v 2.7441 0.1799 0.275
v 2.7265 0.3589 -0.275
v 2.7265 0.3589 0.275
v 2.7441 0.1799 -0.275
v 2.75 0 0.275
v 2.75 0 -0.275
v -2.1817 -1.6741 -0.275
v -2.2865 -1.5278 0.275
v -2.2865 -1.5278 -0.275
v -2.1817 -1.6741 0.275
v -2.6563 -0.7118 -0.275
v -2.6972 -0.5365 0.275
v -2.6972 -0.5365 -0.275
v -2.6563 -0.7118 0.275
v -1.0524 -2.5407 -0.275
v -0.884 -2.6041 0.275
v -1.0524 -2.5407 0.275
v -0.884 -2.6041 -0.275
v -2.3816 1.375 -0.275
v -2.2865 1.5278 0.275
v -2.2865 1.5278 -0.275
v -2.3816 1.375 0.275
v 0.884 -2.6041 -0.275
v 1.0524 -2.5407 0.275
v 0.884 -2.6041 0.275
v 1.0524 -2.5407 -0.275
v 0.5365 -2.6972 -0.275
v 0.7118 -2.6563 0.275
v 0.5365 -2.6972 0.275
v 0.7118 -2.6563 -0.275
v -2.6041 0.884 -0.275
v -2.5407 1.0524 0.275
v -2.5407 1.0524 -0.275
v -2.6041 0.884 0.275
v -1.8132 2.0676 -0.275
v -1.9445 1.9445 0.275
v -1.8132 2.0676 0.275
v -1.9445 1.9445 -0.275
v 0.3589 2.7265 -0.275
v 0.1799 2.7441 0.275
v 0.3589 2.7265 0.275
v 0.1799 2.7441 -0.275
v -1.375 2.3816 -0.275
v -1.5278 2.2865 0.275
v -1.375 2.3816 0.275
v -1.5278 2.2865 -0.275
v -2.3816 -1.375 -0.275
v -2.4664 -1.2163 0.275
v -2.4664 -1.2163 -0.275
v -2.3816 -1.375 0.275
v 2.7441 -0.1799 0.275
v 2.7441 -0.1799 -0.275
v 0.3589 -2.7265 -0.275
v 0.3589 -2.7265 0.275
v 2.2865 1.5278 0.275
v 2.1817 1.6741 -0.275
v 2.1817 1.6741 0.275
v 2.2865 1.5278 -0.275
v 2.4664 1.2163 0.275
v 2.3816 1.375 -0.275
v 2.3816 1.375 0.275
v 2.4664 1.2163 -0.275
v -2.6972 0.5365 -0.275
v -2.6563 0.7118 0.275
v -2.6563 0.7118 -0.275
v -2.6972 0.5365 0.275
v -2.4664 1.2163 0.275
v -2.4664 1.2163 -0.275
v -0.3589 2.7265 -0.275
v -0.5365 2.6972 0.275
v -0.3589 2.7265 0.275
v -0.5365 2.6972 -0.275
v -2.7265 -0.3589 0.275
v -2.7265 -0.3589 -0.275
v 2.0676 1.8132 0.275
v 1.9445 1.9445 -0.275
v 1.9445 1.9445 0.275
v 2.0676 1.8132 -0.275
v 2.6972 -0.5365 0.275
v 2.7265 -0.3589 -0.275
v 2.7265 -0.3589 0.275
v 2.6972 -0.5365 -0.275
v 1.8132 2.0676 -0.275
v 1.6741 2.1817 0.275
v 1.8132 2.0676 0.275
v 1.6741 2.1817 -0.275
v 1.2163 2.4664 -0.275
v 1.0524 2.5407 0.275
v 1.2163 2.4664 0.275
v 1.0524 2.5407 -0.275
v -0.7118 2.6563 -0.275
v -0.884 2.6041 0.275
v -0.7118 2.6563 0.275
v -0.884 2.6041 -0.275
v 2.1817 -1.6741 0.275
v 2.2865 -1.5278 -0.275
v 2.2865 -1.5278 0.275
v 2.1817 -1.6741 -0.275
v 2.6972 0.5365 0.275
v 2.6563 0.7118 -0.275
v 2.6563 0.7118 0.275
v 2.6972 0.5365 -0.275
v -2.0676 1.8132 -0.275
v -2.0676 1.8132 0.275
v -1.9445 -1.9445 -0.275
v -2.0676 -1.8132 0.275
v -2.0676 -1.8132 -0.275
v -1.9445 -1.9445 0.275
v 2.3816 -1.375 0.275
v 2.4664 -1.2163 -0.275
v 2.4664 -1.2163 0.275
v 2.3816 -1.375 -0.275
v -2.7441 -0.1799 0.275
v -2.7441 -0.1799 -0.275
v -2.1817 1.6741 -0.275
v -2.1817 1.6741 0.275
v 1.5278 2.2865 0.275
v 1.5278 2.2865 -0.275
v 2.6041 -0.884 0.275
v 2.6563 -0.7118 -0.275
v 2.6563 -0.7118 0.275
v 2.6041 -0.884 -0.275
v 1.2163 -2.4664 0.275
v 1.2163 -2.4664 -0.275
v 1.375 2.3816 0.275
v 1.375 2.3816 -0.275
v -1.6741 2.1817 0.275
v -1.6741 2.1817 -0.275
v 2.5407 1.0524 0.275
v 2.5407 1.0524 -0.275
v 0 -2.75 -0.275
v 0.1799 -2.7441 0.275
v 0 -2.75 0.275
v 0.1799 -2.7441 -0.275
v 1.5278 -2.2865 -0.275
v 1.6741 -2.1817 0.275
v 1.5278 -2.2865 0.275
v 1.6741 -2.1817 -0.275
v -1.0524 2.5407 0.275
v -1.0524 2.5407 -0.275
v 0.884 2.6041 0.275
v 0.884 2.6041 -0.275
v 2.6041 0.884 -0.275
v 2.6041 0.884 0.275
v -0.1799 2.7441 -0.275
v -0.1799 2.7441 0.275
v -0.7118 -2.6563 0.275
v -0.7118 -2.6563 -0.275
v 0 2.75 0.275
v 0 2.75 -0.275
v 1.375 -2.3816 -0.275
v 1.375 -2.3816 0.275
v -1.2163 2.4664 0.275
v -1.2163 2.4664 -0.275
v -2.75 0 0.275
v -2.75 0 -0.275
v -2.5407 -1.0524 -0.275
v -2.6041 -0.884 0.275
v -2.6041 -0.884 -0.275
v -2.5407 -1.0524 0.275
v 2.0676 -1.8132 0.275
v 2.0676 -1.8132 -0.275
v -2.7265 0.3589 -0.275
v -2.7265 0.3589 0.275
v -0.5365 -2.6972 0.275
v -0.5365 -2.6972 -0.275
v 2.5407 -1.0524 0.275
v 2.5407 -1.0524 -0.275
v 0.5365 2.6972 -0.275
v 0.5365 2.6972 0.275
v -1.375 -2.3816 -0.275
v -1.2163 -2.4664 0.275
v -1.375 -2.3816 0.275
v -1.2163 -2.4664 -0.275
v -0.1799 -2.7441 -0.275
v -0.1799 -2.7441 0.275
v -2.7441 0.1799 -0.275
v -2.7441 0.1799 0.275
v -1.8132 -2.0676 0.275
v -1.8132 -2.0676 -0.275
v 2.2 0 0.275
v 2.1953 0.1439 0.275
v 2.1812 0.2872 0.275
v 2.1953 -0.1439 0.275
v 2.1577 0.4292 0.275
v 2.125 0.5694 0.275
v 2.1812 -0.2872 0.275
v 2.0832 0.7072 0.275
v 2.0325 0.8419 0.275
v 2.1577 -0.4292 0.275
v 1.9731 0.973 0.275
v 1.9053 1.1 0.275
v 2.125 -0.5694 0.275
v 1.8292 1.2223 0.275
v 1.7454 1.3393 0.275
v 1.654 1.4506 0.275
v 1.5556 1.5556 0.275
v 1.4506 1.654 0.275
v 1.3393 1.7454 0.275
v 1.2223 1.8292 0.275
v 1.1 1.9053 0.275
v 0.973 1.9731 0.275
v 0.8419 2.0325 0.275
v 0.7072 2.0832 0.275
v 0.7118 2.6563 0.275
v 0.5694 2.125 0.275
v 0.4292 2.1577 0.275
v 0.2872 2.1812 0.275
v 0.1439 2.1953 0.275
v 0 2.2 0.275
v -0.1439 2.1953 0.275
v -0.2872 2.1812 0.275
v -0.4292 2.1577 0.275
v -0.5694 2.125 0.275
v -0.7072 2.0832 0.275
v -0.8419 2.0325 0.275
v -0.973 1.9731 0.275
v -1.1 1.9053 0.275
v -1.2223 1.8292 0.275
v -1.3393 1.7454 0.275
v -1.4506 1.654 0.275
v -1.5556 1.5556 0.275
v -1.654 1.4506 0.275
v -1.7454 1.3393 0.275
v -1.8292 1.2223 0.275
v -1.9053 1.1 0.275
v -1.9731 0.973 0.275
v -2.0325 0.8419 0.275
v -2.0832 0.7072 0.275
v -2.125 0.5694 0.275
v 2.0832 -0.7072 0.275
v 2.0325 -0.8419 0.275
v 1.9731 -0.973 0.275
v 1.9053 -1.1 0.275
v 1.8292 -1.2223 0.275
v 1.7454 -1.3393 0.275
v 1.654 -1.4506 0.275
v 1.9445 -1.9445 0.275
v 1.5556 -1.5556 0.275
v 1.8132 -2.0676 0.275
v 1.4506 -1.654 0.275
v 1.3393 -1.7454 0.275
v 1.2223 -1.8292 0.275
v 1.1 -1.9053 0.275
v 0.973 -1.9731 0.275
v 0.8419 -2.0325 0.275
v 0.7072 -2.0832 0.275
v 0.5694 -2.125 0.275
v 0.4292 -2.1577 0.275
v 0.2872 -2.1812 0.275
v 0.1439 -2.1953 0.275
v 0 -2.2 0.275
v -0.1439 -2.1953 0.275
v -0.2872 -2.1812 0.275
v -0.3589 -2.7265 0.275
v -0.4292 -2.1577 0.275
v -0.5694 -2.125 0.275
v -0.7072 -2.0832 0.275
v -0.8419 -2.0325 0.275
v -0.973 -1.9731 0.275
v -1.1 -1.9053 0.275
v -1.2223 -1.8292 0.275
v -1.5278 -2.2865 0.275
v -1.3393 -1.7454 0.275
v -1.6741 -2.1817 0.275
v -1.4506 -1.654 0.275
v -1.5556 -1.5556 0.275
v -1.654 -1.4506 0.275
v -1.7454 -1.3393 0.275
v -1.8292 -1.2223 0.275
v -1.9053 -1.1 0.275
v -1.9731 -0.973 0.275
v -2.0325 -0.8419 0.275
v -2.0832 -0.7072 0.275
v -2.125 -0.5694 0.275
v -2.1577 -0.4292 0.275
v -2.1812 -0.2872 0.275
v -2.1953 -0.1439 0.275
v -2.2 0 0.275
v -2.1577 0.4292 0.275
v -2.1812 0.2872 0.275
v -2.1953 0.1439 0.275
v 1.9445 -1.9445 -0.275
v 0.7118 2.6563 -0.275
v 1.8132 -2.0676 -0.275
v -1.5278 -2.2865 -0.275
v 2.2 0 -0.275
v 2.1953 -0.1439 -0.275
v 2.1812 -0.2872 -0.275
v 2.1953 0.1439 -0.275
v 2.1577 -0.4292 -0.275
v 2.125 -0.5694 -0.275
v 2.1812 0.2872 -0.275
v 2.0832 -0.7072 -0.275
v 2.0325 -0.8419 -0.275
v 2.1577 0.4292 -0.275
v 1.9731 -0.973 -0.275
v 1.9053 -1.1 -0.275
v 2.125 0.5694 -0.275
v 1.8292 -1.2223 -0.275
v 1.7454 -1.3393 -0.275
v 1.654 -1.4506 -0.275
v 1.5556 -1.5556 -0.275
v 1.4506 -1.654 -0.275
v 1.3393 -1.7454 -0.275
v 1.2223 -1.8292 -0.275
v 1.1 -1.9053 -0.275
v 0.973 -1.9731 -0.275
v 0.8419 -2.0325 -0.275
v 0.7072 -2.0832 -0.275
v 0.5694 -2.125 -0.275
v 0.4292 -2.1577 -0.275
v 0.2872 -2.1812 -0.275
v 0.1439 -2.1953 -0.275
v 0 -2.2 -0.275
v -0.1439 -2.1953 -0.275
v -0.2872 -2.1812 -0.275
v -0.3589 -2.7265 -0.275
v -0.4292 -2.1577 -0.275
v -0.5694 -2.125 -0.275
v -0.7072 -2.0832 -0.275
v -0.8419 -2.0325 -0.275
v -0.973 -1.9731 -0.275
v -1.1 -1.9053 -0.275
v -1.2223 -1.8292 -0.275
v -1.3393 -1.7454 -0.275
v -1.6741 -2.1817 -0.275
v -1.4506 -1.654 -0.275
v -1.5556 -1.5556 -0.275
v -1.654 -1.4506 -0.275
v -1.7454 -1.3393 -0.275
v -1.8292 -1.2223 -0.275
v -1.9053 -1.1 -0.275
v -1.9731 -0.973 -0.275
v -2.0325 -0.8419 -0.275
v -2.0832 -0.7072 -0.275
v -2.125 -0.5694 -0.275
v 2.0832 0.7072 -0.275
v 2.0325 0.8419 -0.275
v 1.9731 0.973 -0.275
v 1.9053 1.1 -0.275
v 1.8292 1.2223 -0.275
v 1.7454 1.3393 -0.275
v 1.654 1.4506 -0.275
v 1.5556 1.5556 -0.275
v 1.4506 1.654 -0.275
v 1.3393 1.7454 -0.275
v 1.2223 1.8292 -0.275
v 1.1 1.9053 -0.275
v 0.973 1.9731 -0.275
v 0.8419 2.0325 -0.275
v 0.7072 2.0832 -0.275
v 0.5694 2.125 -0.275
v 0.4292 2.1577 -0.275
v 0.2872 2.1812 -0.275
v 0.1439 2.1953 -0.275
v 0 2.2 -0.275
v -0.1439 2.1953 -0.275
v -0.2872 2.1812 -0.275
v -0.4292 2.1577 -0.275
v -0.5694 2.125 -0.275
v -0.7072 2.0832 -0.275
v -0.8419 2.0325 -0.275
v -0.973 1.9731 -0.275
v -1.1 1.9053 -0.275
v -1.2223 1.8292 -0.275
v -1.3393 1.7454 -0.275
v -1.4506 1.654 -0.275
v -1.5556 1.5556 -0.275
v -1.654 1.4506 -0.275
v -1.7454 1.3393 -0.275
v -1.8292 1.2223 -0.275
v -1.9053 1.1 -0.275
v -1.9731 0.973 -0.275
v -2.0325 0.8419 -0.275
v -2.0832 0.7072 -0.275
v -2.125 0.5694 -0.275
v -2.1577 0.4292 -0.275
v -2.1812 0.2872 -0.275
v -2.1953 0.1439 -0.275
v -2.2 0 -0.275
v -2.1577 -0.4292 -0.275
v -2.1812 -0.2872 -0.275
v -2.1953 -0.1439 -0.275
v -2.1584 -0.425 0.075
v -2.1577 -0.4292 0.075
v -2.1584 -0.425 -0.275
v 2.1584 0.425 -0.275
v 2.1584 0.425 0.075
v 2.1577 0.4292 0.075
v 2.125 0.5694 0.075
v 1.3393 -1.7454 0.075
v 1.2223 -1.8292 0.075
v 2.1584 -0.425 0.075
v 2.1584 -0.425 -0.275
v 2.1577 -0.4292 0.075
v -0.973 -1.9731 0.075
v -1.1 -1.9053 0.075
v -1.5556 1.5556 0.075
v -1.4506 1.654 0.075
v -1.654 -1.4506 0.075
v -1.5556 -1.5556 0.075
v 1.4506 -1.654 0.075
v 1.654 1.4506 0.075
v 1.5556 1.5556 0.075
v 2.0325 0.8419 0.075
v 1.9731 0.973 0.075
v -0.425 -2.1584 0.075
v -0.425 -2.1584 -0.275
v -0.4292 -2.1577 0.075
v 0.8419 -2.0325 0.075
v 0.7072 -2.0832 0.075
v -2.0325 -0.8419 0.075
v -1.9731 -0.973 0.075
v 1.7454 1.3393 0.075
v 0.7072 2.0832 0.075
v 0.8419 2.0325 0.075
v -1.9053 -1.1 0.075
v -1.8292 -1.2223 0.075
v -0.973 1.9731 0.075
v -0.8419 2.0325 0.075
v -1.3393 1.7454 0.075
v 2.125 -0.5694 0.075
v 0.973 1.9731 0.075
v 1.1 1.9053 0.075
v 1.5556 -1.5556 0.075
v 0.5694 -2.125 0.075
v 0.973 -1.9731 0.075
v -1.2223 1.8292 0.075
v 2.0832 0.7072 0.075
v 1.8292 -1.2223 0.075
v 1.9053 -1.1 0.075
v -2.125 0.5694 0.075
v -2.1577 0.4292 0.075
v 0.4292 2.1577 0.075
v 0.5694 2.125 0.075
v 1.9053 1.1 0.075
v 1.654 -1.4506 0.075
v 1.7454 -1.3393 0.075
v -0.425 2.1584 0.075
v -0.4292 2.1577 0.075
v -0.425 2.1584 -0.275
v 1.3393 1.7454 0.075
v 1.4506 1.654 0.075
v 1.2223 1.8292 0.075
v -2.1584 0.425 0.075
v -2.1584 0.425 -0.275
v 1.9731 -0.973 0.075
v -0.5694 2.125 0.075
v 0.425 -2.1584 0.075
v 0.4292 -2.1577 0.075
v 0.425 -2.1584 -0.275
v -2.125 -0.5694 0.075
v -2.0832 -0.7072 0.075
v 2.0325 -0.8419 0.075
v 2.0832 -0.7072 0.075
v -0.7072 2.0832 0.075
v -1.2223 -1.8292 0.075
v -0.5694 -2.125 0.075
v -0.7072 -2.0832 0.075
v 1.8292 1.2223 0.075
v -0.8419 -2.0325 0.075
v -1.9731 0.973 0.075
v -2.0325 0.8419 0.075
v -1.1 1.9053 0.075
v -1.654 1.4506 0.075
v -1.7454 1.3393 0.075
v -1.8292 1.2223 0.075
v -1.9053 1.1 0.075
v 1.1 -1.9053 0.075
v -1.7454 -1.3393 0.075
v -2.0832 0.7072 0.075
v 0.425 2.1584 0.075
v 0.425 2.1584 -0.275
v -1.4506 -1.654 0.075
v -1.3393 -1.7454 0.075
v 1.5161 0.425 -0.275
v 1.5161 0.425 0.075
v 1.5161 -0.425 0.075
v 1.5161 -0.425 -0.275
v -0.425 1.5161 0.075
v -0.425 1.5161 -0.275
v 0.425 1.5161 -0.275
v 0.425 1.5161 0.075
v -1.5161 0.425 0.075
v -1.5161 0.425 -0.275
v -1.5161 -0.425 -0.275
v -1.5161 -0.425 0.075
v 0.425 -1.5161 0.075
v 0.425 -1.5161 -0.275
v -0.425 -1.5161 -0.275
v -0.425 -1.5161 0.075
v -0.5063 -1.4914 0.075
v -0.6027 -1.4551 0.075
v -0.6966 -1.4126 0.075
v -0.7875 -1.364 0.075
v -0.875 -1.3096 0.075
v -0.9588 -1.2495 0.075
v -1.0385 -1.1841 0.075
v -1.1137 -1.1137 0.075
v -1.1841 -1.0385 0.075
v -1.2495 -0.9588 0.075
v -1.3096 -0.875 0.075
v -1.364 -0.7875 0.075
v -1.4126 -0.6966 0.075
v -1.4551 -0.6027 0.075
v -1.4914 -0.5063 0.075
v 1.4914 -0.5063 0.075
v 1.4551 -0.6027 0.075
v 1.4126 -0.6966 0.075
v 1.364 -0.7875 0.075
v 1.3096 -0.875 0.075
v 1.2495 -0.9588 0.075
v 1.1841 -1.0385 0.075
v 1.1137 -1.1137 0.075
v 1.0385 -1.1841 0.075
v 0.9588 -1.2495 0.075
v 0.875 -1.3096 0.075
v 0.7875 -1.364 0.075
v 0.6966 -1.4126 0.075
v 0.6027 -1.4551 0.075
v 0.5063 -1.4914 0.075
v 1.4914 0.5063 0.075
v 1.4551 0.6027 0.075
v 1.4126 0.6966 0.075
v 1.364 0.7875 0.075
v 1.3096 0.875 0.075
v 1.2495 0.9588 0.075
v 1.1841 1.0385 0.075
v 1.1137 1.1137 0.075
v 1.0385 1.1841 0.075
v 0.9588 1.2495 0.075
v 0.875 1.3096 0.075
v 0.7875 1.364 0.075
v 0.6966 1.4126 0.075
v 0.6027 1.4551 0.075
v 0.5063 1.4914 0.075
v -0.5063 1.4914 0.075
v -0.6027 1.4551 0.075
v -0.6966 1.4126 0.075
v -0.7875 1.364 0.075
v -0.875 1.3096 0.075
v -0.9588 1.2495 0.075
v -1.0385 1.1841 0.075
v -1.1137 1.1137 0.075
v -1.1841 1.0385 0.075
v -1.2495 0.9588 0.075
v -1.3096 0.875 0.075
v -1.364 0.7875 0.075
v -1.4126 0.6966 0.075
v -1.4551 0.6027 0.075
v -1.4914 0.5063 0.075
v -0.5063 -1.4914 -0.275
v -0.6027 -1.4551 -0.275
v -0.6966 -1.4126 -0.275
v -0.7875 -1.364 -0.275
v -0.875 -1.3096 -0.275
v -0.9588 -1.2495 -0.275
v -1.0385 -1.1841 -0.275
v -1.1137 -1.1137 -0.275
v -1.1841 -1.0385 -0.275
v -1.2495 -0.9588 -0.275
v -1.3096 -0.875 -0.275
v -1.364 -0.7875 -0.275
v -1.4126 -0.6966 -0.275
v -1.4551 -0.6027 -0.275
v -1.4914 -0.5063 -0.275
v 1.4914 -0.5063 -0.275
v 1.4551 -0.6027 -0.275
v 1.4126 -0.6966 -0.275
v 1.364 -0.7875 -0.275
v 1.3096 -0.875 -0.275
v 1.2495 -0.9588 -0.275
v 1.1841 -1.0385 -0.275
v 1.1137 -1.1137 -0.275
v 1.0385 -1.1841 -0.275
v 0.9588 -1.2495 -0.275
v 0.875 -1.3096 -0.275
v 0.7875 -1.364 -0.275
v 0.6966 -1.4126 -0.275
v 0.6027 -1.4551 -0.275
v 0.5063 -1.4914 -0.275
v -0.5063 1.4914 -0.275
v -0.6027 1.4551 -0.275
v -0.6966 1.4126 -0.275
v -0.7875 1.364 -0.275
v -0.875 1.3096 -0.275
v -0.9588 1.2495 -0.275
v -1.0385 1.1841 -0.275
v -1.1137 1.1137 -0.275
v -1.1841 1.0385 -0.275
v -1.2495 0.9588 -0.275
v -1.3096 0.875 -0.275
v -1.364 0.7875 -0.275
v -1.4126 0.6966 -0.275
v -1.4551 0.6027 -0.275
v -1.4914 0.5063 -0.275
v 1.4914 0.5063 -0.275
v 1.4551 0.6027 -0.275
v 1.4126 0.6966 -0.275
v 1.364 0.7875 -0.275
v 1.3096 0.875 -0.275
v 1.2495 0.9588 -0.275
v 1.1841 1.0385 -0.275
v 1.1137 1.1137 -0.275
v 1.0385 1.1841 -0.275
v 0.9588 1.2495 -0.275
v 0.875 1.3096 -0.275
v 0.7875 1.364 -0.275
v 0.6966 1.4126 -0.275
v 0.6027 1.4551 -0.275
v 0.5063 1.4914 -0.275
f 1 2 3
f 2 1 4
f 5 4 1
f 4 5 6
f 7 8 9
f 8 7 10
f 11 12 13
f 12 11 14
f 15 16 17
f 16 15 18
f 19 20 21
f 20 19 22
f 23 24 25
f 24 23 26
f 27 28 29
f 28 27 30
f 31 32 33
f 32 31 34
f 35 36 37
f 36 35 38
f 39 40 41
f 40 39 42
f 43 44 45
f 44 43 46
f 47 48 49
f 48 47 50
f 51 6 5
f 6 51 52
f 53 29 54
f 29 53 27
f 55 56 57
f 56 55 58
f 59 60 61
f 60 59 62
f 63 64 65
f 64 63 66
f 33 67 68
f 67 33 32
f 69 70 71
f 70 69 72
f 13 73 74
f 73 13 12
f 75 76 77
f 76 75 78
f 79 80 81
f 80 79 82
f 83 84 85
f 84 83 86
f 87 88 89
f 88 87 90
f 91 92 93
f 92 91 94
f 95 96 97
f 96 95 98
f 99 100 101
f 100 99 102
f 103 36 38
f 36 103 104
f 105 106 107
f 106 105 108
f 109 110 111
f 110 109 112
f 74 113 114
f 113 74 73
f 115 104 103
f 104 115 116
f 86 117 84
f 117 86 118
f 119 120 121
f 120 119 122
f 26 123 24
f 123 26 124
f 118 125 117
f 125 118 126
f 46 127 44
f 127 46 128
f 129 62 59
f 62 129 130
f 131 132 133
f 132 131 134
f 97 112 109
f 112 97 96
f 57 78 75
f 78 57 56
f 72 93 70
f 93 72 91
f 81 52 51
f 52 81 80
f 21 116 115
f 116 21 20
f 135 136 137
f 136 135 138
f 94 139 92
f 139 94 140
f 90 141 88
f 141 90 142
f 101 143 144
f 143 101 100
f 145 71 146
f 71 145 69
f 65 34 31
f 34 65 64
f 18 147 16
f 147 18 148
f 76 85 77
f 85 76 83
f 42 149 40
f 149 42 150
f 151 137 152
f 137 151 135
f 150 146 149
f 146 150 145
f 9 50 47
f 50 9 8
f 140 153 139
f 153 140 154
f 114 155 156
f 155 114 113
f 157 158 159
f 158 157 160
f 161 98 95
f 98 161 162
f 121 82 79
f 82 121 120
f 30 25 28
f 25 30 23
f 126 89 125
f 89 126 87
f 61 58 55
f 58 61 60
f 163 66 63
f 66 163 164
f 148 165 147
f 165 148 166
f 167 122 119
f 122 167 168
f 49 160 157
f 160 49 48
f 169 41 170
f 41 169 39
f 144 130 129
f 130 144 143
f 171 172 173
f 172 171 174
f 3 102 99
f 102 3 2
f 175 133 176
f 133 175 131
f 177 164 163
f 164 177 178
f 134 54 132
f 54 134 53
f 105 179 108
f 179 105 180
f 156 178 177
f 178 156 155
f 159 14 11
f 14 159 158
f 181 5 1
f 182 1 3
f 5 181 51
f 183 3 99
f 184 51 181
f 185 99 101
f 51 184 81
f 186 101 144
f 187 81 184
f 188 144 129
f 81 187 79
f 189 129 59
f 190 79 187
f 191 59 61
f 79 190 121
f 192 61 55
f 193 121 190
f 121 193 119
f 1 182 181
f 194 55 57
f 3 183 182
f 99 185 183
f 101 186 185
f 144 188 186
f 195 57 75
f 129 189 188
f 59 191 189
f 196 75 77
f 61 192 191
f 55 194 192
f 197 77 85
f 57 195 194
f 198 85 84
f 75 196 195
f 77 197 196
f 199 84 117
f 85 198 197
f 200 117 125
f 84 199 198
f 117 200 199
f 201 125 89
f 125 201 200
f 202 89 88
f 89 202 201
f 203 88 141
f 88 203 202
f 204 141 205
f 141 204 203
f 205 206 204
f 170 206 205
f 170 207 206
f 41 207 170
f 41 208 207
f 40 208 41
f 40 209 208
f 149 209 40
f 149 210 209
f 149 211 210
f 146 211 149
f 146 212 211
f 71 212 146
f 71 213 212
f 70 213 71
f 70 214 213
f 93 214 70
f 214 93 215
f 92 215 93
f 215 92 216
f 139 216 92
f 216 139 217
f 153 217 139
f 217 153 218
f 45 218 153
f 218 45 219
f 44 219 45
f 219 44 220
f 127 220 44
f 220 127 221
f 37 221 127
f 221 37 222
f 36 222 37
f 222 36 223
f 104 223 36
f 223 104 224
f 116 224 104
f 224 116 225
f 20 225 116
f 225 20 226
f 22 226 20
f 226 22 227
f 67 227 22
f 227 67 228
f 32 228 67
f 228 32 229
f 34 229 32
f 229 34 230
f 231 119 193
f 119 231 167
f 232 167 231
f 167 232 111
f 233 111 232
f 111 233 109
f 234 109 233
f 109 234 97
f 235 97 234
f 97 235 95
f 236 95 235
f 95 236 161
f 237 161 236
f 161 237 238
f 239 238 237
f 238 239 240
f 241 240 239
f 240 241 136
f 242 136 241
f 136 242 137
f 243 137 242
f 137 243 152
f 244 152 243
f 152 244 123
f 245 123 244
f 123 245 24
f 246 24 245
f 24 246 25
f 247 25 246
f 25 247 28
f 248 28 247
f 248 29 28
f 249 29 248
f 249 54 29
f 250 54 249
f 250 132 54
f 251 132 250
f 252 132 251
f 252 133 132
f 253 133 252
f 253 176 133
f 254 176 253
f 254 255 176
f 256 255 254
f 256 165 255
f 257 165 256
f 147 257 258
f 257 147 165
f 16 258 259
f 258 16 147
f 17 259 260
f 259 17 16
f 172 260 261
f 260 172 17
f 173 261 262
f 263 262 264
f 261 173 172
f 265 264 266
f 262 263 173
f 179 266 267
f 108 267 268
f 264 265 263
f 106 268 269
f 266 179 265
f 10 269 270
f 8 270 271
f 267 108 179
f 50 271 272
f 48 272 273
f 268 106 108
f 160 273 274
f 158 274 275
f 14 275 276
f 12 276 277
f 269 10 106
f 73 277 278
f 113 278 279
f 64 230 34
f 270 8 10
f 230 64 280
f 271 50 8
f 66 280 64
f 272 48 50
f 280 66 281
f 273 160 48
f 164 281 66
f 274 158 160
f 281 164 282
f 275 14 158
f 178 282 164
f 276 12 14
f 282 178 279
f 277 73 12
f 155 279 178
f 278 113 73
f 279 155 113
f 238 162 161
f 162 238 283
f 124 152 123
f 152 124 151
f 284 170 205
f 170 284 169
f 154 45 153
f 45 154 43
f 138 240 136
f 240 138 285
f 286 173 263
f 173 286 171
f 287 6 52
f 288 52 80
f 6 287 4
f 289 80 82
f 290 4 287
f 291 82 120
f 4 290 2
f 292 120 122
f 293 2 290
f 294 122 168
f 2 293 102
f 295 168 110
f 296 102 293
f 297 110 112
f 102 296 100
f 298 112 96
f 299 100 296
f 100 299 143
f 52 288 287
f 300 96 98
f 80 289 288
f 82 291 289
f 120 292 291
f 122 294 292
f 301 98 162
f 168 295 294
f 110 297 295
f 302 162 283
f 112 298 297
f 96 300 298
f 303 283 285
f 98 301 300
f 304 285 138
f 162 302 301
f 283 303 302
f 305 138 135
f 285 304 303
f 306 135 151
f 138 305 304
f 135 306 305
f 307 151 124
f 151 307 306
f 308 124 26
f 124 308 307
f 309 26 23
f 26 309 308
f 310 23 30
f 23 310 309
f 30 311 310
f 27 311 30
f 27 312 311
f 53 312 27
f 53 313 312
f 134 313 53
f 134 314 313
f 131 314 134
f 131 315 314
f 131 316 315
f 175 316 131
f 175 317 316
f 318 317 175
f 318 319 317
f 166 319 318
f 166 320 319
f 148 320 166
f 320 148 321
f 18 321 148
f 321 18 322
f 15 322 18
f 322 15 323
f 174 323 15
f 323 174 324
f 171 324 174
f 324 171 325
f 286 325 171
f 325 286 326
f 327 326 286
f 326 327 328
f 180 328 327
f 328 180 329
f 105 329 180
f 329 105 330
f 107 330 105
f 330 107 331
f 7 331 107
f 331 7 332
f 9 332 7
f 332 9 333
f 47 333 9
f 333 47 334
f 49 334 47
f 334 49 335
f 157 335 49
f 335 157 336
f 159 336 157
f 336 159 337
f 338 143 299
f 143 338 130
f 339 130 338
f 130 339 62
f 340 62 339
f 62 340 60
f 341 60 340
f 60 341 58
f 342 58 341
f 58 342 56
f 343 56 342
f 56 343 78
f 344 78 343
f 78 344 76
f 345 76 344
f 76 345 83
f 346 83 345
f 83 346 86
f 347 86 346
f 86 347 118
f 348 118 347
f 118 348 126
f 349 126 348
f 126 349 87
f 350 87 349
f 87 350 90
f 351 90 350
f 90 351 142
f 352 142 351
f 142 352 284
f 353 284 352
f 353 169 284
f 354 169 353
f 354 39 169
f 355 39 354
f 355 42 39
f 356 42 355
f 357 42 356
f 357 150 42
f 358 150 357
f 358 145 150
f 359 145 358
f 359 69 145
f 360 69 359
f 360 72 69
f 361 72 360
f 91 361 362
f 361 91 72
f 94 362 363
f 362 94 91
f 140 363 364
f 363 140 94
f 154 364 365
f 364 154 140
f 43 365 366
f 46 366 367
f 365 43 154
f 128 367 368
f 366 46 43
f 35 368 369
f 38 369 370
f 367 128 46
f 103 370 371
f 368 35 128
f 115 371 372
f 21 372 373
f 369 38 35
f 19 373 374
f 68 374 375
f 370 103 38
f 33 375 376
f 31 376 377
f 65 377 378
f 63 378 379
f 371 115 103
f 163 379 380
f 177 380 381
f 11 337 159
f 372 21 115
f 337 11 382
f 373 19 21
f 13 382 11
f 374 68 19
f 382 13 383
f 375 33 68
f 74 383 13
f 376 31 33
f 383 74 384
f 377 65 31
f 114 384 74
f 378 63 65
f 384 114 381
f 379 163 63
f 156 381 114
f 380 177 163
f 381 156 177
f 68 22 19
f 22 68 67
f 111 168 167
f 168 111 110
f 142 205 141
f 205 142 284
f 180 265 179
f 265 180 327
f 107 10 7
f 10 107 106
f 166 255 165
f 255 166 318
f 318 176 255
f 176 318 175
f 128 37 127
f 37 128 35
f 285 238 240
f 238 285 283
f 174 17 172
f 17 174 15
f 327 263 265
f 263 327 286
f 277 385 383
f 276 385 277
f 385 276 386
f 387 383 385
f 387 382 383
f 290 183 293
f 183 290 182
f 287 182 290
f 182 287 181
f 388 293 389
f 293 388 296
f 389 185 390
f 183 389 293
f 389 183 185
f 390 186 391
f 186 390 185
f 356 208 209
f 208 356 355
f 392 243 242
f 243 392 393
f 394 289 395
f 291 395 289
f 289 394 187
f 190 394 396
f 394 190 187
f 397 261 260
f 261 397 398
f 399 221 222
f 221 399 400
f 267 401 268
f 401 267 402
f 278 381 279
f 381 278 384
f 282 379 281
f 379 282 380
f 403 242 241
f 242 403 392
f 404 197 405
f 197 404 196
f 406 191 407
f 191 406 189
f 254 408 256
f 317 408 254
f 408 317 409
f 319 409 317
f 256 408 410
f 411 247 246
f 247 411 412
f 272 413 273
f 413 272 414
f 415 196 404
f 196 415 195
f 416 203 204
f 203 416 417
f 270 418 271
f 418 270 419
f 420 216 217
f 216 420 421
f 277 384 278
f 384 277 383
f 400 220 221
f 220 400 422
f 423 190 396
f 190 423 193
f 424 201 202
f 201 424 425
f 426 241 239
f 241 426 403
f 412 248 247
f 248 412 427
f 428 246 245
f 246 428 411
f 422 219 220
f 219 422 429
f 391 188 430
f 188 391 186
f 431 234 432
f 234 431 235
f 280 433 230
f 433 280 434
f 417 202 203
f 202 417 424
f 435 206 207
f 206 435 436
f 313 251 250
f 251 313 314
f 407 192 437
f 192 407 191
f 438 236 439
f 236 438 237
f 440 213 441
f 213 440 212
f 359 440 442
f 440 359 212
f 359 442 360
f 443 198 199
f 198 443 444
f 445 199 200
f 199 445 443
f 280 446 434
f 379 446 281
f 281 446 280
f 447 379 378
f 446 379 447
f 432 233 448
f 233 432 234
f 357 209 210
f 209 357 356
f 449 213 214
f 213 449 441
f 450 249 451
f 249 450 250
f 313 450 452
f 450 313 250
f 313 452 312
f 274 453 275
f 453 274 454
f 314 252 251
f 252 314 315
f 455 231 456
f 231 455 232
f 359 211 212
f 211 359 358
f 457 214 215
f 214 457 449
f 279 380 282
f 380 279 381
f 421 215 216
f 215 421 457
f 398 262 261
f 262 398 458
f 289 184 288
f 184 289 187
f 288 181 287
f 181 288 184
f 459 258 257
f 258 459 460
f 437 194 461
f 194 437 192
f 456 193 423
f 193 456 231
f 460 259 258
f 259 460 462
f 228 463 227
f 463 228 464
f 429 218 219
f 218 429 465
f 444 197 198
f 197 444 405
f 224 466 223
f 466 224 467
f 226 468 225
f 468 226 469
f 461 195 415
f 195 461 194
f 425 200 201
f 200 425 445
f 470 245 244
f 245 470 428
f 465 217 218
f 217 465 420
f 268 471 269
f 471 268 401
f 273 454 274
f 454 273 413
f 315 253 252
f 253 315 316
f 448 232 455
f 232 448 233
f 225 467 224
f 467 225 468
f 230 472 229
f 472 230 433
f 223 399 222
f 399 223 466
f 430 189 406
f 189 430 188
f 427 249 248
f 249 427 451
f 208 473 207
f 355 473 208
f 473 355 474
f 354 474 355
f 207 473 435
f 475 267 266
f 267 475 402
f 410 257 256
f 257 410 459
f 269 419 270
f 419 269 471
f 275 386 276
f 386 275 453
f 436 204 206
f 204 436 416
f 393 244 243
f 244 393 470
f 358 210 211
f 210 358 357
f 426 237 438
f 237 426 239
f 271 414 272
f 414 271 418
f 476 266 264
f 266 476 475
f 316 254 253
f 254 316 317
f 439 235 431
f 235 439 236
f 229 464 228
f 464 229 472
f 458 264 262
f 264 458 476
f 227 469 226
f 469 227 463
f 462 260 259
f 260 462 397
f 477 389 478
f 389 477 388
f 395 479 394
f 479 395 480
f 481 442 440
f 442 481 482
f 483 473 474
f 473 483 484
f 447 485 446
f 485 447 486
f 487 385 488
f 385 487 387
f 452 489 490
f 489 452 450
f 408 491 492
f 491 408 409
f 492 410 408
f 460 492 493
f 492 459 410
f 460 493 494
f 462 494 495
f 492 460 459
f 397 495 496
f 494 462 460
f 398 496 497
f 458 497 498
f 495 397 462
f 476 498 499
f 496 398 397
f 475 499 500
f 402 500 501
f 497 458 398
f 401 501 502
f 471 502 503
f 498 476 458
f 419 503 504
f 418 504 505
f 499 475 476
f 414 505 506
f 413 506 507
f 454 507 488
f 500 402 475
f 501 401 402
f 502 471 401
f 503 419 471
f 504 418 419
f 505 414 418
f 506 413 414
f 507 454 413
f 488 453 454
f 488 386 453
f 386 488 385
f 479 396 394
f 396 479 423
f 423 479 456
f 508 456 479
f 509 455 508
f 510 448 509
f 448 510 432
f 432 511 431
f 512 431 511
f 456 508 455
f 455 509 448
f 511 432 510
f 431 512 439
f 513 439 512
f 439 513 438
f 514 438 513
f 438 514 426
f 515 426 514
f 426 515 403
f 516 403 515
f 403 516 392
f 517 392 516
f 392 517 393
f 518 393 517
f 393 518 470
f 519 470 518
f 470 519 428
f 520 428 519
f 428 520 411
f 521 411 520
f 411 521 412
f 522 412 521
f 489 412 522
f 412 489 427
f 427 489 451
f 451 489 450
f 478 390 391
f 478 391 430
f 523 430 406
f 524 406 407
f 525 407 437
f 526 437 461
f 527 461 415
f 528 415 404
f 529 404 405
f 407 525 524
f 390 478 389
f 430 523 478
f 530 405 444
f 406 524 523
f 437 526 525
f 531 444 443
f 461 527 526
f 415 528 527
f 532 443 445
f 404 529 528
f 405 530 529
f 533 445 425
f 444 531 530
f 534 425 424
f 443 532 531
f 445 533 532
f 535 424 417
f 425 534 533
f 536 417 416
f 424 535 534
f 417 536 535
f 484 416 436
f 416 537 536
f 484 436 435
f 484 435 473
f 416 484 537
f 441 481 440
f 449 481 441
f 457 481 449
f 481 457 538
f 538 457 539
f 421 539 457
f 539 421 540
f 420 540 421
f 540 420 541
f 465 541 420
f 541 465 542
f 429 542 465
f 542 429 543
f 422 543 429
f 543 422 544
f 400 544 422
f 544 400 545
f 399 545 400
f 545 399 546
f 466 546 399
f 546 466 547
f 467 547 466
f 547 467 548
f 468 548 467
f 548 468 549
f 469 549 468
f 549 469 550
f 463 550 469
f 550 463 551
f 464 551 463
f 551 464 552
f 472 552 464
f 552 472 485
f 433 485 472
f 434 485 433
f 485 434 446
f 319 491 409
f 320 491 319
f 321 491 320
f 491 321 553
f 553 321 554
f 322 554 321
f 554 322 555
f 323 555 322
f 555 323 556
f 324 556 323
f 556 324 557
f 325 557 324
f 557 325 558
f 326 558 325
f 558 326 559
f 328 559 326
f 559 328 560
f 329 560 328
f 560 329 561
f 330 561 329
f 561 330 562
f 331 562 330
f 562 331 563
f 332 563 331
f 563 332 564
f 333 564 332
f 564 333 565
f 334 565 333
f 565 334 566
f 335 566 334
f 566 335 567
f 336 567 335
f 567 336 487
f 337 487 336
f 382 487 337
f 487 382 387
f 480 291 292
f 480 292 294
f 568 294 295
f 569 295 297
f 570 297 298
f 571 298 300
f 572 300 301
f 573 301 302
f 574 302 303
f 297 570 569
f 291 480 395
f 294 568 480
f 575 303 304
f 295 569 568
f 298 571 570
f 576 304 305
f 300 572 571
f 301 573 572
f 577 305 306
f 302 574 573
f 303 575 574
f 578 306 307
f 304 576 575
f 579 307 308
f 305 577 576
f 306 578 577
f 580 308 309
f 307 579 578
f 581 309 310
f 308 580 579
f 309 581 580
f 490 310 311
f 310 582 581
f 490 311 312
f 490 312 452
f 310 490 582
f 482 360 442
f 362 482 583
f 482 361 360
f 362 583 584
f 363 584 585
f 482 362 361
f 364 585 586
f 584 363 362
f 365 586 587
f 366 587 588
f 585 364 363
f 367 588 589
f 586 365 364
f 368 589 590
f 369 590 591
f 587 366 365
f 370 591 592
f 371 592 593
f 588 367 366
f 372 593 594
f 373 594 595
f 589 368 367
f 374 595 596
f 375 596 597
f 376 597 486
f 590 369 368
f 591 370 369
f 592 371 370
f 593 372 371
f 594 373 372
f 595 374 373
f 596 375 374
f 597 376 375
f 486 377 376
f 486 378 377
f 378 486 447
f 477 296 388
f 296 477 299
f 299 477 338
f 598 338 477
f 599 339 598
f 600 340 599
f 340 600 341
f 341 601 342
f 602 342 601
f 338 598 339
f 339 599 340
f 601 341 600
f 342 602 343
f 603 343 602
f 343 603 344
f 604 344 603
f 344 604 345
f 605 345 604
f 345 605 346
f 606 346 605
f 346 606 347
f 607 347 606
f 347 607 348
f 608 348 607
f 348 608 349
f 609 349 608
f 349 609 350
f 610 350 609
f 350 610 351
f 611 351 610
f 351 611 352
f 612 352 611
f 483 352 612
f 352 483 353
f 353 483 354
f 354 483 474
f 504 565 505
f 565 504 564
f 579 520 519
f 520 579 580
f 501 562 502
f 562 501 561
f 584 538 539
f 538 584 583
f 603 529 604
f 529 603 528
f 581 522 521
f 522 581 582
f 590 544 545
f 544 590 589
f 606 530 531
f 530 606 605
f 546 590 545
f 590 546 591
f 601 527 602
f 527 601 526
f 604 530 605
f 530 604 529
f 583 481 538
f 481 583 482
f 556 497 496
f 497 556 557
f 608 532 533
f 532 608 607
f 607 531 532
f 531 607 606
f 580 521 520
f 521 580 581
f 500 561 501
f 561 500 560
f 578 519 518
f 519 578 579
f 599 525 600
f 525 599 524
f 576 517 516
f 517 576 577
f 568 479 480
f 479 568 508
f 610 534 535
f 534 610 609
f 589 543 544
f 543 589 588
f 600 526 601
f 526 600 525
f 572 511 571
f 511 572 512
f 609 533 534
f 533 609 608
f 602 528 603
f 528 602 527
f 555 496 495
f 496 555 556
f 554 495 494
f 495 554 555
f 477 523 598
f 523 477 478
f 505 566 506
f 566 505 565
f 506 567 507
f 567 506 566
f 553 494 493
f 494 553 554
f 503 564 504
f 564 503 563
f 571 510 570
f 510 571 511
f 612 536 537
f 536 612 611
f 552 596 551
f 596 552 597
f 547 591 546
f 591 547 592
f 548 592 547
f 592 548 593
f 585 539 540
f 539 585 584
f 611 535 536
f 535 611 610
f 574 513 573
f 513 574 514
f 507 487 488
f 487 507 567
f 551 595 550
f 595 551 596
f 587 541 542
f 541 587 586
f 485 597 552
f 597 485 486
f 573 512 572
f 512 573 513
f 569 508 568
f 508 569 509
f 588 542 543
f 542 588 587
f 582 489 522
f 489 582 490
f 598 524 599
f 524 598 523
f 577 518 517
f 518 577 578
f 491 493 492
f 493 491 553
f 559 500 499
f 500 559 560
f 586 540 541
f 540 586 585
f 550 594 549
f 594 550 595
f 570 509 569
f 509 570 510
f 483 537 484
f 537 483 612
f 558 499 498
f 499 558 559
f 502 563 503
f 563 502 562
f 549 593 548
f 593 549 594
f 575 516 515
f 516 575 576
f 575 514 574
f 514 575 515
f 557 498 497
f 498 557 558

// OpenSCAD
// --- TEKTONOLOGY M3 RETAINER WASHER ---
// Push-on anti-loss clip for M3×0.5 socket-head cap screws (Prayer Sole cap).
// Rigid outer ring seats against the cap wall; four flex prongs extend inward
// from the ring bore and grip the shank (outlet-cover screw-retainer style).
//
// Print flat (XY), 0.2 mm layers; PETG or nylon recommended for flex/fatigue.

// --- M3 thread envelope ---
thread_major = 3.0;   // M3 nominal major diameter (mm)
thread_pitch = 0.5;

// --- Outer seating ring (keep in sync with washer_ring_od in config.scad) ---
ring_od      = 5.5;   // seats on cap boss / wall (cf. commercial panel retainer ≈ 4.3)
ring_id      = 4.4;   // inner bore — prongs root on this wall
ring_height  = 0.55;  // rigid seat flange (Z)

// --- Flex prongs (fused to ring inner wall) ---
prong_height = 0.35;  // thin grip only — cf. stamped panel retainers ≈ 0.4 mm
grip_dia     = 2.65;  // engaged ID — slightly under major Ø for thread bite
entry_dia    = 3.15;  // lead-in at prong tips (screw spreads prongs on install)
prong_count  = 4;
slot_width   = 0.85;  // gap between prongs (mm) — narrower for four fingers
// Prongs at cap-facing / seat side of ring
prong_z      = -(ring_height / 2) + (prong_height / 2);

// --- Mesh quality ---
preview = false;
$fn = preview ? 32 : 96;

// --- Optional batch layout for printing ---
print_qty = 1;        // set >1 to lay out a small plate
print_pitch = ring_od + 1.5;

// =====================================================================
// WASHER BODY
// =====================================================================

module outer_ring() {
  difference() {
    cylinder(d=ring_od, h=ring_height, center=true);
    cylinder(d=ring_id, h=ring_height + 0.02, center=true);
  }
}

// Four prongs cut from a disk fused to the ring OD/ID wall at prong_z.
module flex_prongs() {
  r_o = ring_od / 2;
  entry_r = entry_dia / 2;

  translate([0, 0, prong_z])
  difference() {
    // One piece with outer ring wall — roots on ring_id bore
    cylinder(d=ring_od, h=prong_height, center=true);

    // Lead-in bore at prong tips
    cylinder(d=entry_dia, h=prong_height + 0.02, center=true);

    // Radial slots → four prongs attached at the outer ring
    for (i = [0 : prong_count - 1]) {
      rotate([0, 0, i * (360 / prong_count)])
        translate([(entry_r + r_o) / 2, 0, 0])
          cube([r_o - entry_r + 0.2, slot_width, prong_height + 0.02], center=true);
    }
  }
}

module m3_retainer_washer() {
  union() {
    outer_ring();
    flex_prongs();
  }
}

// =====================================================================
// DEBUG — M3 shank for fit check (comment out for STL export)
// =====================================================================

module debug_m3_shank(len = 12) {
  color("silver", 0.55)
    union() {
      translate([0, 0, ring_height / 2 + 0.01])
        cylinder(d=thread_major, h=len);
      translate([0, 0, ring_height / 2 + len + 1.75])
        cylinder(d=5.5, h=3.5, $fn=6); // rough socket-head stand-in
    }
}

// =====================================================================
// RENDERING
// =====================================================================

module retainer_washer_plate(qty = print_qty) {
  if (qty <= 1) {
    m3_retainer_washer();
  } else {
    for (i = [0 : qty - 1])
      translate([i * print_pitch, 0, 0])
        m3_retainer_washer();
  }
}

retainer_washer_plate();

// Uncomment to preview washer seated on shank:
// %translate([0, 0, ring_height / 2]) debug_m3_shank();
